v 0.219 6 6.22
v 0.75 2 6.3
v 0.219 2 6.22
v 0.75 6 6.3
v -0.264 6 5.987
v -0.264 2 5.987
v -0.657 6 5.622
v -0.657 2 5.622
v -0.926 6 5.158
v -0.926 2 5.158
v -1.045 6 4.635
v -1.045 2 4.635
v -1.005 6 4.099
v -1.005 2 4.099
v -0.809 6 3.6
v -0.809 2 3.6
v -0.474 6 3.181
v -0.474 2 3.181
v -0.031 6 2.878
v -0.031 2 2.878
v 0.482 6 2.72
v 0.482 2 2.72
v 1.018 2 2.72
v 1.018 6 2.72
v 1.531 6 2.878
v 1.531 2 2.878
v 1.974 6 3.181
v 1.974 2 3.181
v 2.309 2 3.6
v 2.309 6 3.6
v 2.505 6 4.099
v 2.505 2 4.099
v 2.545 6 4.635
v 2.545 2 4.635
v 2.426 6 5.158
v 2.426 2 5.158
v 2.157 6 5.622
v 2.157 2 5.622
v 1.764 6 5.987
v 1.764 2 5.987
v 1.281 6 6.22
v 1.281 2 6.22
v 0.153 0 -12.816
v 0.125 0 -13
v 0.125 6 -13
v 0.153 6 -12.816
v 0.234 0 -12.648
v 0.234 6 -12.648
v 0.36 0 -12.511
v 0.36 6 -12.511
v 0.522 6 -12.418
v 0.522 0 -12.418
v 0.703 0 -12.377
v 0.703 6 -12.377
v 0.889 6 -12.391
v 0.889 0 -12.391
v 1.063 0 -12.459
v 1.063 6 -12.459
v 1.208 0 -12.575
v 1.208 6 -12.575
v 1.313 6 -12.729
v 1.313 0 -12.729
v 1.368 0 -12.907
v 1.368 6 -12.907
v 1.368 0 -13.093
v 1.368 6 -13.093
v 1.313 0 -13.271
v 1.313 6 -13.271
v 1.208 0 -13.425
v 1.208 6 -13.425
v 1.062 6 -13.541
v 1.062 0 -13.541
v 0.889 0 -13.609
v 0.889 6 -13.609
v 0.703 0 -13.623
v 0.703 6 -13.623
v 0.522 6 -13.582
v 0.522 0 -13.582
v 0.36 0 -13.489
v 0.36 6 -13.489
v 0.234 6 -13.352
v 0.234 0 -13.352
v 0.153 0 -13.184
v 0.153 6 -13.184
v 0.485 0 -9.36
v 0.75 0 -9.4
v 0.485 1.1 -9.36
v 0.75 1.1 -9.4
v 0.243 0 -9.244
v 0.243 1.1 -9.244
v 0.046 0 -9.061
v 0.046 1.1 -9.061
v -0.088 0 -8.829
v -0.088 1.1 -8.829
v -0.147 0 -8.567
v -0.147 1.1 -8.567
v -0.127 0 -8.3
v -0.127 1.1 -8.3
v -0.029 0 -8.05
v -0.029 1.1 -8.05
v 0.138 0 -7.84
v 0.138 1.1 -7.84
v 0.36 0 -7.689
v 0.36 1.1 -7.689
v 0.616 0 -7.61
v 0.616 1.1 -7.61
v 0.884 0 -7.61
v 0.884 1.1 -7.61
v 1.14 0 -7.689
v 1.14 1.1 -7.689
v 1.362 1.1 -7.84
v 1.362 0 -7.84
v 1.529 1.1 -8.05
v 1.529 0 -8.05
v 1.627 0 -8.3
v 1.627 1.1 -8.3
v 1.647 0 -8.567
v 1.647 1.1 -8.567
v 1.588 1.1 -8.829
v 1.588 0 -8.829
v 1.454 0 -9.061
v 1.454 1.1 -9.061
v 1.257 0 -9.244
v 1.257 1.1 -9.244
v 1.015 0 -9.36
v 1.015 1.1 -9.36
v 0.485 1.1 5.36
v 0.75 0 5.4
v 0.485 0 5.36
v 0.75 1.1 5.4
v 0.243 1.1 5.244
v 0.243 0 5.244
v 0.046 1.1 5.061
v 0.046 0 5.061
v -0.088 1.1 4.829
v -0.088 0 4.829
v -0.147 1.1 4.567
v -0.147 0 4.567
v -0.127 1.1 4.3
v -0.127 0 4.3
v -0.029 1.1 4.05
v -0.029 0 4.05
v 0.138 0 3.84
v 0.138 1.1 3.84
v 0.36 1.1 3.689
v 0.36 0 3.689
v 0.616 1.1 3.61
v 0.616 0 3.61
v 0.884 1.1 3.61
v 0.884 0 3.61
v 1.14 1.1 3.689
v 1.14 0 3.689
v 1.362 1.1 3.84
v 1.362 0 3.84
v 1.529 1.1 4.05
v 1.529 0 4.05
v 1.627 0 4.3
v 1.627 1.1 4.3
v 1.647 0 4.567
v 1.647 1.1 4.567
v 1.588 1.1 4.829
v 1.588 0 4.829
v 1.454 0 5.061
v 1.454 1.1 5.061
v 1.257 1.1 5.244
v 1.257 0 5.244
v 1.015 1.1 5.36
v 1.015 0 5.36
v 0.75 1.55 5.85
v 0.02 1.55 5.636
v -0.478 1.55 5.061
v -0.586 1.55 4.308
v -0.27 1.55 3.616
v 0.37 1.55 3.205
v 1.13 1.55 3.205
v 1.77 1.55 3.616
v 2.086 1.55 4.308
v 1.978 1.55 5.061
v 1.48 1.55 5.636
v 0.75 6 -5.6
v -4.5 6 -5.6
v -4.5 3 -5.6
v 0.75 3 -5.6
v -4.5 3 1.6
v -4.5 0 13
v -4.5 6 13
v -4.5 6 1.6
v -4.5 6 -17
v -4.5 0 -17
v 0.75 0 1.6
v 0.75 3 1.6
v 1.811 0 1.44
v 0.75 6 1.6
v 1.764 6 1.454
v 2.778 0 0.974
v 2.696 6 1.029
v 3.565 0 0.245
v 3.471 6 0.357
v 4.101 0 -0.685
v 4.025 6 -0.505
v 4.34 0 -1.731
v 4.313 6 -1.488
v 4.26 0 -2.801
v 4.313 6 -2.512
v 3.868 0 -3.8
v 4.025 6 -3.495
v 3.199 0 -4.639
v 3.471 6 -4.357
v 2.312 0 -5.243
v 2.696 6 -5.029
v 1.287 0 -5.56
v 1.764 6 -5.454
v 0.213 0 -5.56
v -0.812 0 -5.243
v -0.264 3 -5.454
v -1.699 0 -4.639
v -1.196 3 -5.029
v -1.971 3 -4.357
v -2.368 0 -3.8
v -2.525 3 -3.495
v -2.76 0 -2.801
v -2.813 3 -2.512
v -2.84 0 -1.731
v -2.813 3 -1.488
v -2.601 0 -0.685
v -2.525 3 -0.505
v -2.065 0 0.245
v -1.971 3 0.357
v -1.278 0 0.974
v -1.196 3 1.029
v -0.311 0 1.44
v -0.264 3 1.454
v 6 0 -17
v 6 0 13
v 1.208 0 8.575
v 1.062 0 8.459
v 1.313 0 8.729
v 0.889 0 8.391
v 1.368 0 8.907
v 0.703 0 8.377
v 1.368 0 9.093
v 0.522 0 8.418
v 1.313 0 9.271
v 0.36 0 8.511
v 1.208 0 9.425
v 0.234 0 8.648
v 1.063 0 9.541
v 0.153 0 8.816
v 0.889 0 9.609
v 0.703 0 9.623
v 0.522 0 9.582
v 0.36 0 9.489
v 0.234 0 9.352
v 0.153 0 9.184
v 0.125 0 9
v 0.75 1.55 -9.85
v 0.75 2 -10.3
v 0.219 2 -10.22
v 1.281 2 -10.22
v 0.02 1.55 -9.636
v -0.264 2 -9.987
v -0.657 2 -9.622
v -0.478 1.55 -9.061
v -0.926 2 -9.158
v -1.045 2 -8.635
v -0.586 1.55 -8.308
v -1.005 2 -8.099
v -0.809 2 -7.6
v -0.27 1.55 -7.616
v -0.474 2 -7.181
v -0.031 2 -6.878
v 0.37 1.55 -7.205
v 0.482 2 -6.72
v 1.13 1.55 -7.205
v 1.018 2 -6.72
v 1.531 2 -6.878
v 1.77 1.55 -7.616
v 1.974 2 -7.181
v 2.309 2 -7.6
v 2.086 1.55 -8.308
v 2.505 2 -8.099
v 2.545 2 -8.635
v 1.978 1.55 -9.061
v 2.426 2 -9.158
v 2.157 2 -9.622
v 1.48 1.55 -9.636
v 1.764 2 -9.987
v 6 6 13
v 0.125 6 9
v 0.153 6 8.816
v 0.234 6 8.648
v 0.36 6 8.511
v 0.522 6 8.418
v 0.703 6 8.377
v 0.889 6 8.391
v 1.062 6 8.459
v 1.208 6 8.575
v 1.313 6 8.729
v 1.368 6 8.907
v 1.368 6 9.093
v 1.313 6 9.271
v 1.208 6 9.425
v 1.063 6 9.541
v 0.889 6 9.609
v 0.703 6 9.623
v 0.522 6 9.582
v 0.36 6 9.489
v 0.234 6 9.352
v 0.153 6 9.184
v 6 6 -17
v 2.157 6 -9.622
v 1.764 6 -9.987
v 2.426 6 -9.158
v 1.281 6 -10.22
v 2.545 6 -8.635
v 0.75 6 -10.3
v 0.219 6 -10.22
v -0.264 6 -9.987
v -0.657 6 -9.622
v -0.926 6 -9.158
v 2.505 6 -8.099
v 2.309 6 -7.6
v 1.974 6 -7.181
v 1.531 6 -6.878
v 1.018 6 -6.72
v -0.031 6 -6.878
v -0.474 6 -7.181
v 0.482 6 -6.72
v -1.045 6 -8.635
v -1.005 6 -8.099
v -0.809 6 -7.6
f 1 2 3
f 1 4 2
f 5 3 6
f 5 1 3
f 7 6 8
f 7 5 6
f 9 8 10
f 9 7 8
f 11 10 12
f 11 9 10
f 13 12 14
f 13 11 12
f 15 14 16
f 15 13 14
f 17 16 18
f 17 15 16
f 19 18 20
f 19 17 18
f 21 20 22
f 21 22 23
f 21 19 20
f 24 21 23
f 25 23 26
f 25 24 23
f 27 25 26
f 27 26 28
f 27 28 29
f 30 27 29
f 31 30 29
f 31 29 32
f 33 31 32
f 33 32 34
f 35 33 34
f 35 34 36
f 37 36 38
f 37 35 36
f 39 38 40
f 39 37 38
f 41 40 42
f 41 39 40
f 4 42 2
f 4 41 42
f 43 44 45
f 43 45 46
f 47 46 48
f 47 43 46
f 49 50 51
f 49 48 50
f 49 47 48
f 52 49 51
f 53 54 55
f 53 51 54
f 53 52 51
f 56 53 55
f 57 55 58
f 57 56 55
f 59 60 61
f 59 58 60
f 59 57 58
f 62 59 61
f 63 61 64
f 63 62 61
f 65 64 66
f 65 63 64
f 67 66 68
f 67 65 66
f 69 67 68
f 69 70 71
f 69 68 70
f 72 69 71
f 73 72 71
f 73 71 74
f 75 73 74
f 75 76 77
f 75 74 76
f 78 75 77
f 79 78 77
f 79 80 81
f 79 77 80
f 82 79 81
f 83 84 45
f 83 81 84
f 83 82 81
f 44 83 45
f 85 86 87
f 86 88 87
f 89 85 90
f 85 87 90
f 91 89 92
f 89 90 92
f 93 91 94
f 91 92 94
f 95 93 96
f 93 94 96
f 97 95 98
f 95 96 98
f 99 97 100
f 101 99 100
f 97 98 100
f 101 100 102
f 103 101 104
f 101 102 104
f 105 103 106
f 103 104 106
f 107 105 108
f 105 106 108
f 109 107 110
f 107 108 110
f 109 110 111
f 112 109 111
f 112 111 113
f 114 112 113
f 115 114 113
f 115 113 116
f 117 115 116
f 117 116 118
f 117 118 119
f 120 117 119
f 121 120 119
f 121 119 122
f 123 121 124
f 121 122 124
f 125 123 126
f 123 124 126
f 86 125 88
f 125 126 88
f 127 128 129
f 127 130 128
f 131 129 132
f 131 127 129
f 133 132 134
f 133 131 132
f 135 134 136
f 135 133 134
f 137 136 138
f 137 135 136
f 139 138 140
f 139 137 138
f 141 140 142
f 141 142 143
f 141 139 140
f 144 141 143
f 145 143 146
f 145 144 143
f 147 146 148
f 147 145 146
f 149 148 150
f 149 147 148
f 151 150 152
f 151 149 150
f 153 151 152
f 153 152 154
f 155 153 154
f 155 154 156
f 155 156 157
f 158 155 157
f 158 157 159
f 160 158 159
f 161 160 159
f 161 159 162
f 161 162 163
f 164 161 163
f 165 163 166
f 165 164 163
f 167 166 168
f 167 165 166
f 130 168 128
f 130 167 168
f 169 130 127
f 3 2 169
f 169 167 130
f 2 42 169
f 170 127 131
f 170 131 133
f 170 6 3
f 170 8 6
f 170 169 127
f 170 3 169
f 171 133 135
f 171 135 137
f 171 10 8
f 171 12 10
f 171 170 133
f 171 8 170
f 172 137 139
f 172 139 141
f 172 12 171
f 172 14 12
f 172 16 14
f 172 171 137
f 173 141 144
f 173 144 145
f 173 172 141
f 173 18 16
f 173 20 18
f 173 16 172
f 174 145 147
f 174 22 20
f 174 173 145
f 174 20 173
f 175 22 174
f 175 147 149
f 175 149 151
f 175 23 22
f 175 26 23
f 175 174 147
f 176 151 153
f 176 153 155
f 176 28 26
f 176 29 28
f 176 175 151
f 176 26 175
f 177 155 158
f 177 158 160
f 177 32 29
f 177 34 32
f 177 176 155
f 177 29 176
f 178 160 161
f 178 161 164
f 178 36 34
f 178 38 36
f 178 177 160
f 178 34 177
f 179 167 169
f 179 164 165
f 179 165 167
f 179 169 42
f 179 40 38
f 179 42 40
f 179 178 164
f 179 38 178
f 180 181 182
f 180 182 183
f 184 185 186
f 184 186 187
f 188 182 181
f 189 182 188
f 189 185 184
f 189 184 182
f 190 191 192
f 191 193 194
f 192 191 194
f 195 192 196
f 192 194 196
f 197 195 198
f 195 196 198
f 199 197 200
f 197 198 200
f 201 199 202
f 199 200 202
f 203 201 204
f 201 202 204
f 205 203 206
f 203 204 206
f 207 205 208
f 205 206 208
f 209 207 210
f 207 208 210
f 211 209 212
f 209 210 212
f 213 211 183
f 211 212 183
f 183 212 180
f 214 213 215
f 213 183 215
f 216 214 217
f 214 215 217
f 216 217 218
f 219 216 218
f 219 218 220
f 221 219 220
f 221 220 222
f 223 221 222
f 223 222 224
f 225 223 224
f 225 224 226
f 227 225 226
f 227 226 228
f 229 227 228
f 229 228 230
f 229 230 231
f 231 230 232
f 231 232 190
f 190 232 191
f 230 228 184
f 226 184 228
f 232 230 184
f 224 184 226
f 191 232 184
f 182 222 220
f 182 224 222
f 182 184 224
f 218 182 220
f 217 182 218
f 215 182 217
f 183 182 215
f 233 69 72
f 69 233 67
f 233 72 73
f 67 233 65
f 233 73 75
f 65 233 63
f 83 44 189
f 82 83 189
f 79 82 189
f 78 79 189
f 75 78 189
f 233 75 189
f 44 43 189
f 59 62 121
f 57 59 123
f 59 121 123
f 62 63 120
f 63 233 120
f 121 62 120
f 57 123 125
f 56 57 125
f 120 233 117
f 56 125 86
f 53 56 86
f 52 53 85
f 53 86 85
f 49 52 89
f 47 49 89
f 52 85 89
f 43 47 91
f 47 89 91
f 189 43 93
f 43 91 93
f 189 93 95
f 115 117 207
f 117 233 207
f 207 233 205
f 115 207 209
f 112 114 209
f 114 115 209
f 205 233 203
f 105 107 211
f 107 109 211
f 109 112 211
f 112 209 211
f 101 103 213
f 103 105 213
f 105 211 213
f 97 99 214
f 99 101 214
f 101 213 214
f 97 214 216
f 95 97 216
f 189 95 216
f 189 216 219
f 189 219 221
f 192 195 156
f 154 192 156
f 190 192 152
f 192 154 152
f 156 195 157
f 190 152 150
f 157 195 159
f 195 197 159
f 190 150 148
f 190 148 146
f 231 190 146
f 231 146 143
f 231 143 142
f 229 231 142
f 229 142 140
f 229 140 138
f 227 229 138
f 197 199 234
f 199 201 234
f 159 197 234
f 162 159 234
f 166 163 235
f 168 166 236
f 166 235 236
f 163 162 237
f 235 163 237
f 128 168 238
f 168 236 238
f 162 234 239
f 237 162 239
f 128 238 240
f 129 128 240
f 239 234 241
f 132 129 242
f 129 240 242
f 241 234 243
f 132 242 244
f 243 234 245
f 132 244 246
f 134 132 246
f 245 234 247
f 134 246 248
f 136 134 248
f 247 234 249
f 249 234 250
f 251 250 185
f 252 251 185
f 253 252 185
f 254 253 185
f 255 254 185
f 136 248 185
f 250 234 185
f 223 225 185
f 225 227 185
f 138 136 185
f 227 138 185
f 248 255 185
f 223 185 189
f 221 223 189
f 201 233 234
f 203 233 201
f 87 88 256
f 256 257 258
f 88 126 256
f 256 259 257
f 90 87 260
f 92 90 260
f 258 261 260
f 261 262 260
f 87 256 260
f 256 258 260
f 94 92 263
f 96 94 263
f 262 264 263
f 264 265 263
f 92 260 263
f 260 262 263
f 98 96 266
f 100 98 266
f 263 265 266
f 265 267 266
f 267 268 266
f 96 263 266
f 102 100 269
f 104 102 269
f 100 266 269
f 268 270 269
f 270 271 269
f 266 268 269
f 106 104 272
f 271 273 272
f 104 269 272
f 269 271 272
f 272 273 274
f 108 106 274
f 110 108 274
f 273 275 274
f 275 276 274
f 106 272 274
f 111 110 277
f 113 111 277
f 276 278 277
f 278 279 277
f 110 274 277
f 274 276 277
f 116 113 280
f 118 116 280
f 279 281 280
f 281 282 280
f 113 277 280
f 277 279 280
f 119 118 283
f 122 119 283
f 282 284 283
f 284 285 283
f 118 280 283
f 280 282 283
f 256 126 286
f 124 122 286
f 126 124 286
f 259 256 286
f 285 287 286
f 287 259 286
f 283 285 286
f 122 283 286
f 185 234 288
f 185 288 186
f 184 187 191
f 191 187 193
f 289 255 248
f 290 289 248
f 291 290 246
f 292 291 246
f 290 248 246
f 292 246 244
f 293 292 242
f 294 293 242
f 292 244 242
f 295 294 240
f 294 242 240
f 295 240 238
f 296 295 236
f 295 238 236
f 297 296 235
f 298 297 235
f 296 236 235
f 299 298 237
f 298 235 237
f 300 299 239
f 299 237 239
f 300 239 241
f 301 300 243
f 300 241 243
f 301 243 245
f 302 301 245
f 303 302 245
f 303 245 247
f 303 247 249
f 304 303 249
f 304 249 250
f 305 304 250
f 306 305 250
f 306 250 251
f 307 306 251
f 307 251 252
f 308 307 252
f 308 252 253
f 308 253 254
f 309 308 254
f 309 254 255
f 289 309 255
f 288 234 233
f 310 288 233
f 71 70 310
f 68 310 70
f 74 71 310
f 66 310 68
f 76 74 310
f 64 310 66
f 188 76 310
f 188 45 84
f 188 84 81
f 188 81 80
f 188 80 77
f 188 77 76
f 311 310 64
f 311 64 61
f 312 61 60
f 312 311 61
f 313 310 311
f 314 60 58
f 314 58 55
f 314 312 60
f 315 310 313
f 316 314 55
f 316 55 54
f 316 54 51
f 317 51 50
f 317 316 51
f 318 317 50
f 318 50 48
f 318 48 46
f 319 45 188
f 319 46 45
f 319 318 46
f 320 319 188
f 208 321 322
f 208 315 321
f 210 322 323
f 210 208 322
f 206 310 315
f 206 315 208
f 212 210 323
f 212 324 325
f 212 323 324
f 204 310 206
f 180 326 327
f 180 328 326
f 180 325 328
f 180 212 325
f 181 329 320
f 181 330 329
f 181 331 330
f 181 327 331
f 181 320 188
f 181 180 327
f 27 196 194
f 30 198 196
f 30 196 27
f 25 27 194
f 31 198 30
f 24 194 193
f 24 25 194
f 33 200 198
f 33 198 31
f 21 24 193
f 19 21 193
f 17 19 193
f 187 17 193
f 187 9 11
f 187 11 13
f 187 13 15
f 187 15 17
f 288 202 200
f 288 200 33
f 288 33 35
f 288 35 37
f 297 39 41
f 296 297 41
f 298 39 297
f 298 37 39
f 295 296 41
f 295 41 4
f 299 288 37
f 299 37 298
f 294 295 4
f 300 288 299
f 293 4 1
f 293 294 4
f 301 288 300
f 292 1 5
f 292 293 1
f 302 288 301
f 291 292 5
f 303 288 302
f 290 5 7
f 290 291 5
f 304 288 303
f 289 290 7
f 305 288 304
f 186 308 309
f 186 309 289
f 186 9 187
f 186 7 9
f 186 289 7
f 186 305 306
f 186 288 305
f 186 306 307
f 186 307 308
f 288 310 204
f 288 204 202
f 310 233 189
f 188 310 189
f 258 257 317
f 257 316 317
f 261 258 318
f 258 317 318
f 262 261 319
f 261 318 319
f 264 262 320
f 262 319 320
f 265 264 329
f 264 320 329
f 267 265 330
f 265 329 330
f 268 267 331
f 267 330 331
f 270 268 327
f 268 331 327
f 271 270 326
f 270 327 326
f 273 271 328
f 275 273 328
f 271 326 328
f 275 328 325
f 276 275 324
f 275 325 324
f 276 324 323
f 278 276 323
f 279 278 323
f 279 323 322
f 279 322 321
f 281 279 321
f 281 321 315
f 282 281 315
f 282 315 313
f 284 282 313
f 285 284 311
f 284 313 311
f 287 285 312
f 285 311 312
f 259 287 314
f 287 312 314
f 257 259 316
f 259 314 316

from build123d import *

# Parameters (mm, degrees)
BOSS_EXTRUDE1_DEPTH = 6
M1_6_TAPPED_HOLE1_D = 1.25
SKETCH6_R           = 3.6
CUT_EXTRUDE1_DEPTH  = 20
SKETCH7_W           = 5.25
SKETCH7_H           = 7.2
CUT_EXTRUDE2_DEPTH  = 3


with BuildPart() as part:
    # Sketch1 → Boss-Extrude1 (new body)
    with BuildSketch(Plane(origin=(0, 0, 0), x_dir=(1, 0, 0), z_dir=(0, 1, 0))):
        Polygon((6, 2), (6, -13), (-4.5, -13), (-4.5, -2), (-4.5, 2), (1.5, 2), align=None)
    boss_extrude1 = extrude(amount=BOSS_EXTRUDE1_DEPTH)

    # Sketch3 → CSK SLOT for M1.6 Countersunk Flat Head Screw1 (revolve, cut)
    with BuildSketch(Plane(origin=(0.75, 6, 4.5), x_dir=(0, 0, 1), z_dir=(1, 0, 0))):
        Polygon((0, 0), (0, 6), (0.9, 6), (0.9, 4.9), (1.8, 4), (1.8, 0), align=None)
    csk_slot_for_m1_6_countersunk_flat_head = revolve(axis=Axis((0.75, 12.35, 4.5), (0, -1, 0)), mode=Mode.SUBTRACT)

    # M1.6 Tapped Hole1 (through all)
    with Locations(Plane(origin=(0, 6, 0), x_dir=(1, 0, 0), z_dir=(0, 1, 0))):
        with Locations((0.75, -9)):
            m1_6_tapped_hole1 = Hole(M1_6_TAPPED_HOLE1_D / 2)

    # Mirror1: Boss-Extrude1, CSK SLOT for M1.6 Countersunk Flat Head Screw1, M1.6 Tapped Hole1 across plane
    add(boss_extrude1.mirror(Plane(origin=(0, 0, -2), x_dir=(1, 0, 0), z_dir=(0, 0, -1))))
    add(csk_slot_for_m1_6_countersunk_flat_head.mirror(Plane(origin=(0, 0, -2), x_dir=(1, 0, 0), z_dir=(0, 0, -1))), mode=Mode.SUBTRACT)
    add(m1_6_tapped_hole1.mirror(Plane(origin=(0, 0, -2), x_dir=(1, 0, 0), z_dir=(0, 0, -1))), mode=Mode.SUBTRACT)

    # Sketch6 → Cut-Extrude1 (cut, through all)
    with BuildSketch(Plane(origin=(0, 6, 0), x_dir=(1, 0, 0), z_dir=(0, 1, 0))):
        with Locations(Location((0.75, 2, 0), (0, 0, 270))):
            Circle(SKETCH6_R)
    extrude(amount=-CUT_EXTRUDE1_DEPTH, mode=Mode.SUBTRACT)

    # Sketch7 → Cut-Extrude2 (cut)
    with BuildSketch(Plane(origin=(0, 6, 0), x_dir=(1, 0, 0), z_dir=(0, 1, 0))):
        with Locations((-1.875, 2)):
            Rectangle(SKETCH7_W, SKETCH7_H)
    extrude(amount=-CUT_EXTRUDE2_DEPTH, mode=Mode.SUBTRACT)


solid = part.part
